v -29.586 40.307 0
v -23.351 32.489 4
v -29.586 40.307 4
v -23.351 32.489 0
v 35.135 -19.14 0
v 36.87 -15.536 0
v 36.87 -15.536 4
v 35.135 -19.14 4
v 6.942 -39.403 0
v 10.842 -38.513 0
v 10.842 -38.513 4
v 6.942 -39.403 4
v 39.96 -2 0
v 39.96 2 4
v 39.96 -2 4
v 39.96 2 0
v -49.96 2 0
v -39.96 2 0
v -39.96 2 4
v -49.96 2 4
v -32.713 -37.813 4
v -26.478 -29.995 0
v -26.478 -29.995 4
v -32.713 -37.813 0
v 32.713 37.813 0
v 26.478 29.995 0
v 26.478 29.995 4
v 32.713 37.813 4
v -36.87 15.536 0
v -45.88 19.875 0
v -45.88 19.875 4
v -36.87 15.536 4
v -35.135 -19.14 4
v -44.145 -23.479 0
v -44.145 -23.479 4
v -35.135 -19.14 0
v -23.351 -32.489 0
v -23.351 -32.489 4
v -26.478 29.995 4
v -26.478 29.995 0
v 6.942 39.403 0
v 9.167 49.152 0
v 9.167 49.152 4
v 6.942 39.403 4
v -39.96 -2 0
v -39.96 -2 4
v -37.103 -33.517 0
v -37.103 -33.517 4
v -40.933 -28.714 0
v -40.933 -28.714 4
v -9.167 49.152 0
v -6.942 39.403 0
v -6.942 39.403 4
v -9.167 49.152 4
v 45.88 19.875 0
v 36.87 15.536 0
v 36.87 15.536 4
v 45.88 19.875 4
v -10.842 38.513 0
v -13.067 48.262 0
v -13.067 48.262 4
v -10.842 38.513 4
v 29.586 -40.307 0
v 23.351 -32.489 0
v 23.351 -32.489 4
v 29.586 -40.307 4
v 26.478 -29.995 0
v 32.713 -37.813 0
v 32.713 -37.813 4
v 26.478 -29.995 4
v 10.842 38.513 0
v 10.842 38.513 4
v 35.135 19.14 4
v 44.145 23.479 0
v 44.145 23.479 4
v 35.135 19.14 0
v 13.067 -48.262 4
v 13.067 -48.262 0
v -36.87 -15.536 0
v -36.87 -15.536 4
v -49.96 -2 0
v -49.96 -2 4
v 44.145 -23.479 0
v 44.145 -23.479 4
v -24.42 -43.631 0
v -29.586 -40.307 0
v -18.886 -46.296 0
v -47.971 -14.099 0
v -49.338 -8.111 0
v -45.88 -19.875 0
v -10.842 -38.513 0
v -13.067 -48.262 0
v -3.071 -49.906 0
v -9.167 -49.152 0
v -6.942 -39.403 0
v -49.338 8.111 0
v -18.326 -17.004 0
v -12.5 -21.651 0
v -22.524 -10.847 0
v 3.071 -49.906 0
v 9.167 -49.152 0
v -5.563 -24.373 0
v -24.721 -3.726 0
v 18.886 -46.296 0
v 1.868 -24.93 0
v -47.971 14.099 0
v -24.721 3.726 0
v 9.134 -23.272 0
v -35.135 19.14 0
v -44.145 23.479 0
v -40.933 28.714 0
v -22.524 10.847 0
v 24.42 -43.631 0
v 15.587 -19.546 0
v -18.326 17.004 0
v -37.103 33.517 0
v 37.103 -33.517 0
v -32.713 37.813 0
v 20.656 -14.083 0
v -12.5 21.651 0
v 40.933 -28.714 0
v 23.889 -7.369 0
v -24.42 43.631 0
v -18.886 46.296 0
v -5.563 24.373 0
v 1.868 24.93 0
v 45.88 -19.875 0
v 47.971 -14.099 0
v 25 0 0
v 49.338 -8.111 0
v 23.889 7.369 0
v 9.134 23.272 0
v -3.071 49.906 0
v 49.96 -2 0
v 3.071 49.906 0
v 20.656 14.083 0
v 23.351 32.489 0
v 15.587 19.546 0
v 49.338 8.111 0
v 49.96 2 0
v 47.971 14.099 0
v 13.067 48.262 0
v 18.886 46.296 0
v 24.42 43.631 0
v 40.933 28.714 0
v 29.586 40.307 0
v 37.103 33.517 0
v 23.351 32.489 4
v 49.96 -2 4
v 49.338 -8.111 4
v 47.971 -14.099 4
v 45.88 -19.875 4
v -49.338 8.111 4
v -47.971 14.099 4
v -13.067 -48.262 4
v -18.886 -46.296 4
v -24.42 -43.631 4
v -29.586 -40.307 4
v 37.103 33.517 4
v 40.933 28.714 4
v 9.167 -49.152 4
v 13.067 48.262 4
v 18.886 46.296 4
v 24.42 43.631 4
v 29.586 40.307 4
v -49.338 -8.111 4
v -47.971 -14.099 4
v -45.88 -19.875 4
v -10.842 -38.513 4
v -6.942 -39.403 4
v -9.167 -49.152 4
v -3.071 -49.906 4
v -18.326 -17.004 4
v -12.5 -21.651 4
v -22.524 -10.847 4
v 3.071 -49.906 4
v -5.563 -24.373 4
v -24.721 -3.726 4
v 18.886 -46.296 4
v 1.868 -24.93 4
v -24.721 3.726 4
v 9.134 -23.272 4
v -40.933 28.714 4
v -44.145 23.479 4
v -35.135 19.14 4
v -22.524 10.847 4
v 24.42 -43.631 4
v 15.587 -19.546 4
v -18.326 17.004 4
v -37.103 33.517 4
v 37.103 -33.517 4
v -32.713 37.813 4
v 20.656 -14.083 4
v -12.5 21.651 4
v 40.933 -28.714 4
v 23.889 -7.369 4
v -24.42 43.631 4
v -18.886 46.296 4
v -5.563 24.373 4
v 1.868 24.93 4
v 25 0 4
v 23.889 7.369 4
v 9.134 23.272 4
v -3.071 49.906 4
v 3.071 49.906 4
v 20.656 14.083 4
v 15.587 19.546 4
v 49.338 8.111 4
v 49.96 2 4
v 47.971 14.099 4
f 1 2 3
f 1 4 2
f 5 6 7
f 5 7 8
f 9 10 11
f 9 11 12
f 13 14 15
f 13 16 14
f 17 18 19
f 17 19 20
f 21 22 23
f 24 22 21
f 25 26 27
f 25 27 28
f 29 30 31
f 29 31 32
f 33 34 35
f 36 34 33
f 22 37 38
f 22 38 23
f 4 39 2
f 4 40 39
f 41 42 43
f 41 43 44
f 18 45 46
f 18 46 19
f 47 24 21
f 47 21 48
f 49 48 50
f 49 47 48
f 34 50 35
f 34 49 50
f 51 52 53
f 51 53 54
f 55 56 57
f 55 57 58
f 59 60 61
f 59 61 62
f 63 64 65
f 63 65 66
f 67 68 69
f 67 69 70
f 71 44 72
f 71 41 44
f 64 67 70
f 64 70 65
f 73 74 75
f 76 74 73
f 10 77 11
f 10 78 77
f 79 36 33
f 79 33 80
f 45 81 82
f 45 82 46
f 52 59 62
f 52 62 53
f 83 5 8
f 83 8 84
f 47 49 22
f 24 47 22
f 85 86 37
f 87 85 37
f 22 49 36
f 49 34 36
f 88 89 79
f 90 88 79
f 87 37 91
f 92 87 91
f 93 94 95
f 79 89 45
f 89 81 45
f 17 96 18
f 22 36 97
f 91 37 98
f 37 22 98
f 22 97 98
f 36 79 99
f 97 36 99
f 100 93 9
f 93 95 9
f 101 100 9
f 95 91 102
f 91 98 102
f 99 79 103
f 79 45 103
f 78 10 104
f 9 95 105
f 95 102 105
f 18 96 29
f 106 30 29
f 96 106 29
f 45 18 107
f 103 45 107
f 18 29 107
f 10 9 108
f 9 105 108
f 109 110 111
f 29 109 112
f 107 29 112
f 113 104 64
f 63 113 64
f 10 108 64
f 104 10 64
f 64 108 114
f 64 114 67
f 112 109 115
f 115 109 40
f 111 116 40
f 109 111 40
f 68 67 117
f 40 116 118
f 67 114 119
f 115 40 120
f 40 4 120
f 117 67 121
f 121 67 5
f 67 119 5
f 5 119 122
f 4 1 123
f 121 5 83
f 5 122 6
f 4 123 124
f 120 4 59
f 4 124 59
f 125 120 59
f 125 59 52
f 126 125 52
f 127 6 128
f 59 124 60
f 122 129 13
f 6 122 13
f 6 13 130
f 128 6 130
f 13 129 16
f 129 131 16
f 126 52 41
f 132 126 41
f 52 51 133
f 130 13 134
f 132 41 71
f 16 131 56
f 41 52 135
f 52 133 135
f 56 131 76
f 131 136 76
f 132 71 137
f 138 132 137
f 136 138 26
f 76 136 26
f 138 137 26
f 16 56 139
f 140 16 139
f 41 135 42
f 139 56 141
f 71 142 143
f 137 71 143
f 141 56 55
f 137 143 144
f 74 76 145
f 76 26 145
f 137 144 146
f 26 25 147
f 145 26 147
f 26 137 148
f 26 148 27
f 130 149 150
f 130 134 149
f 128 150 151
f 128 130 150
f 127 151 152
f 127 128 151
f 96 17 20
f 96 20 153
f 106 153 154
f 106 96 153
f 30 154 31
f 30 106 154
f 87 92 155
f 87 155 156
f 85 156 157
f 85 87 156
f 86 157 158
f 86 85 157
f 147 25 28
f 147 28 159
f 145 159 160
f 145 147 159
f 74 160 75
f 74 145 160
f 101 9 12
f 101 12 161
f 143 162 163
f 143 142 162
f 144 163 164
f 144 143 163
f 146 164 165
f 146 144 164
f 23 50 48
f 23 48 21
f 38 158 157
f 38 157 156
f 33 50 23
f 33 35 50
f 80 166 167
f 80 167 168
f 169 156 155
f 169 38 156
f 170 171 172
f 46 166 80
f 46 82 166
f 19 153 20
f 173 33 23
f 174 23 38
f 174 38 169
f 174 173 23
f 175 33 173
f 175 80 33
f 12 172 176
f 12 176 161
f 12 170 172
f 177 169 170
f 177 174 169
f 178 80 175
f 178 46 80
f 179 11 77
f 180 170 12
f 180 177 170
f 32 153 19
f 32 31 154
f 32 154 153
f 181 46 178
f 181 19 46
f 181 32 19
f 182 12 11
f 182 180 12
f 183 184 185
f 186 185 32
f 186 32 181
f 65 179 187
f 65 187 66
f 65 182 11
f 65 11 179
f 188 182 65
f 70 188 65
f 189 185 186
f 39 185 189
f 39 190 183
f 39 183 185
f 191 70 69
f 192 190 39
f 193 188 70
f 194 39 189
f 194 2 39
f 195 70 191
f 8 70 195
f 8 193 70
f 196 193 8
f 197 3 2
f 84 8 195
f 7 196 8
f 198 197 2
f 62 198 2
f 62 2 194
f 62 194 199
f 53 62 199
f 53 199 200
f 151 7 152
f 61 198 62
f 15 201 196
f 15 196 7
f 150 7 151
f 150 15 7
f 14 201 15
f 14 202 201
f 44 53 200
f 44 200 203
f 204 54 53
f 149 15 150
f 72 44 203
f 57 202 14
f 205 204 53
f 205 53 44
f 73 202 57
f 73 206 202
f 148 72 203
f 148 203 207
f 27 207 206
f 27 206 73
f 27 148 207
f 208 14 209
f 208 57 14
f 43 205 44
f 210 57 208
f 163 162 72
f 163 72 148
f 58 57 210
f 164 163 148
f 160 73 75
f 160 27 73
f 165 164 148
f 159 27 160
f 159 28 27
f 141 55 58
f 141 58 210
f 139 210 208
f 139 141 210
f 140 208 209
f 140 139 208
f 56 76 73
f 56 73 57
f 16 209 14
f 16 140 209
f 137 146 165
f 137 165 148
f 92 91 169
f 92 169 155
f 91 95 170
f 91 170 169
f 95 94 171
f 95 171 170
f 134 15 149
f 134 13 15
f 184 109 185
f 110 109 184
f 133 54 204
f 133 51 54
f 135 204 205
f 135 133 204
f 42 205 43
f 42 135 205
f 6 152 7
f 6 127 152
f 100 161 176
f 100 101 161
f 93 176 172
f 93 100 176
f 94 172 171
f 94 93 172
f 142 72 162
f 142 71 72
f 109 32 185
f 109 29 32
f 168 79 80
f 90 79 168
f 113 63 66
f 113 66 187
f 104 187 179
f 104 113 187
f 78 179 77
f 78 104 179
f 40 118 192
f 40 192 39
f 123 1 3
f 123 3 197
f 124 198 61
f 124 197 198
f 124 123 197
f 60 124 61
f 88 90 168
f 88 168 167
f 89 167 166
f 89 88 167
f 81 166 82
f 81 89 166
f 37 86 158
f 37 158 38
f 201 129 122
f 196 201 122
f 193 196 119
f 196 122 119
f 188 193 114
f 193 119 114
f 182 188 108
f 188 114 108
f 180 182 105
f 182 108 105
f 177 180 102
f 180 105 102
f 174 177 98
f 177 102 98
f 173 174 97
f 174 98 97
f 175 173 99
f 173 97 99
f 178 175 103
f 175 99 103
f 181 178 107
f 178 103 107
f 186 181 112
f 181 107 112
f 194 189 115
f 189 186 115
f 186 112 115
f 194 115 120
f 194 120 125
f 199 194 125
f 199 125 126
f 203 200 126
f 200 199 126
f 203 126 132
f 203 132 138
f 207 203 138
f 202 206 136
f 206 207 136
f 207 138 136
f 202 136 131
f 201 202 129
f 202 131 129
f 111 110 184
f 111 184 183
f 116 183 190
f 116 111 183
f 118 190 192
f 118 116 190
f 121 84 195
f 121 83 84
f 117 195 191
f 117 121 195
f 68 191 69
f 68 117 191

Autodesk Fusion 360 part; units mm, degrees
sketch "Sketch1" plane through (0, 0, 0) normal (0, 0, 1) x (1, 0, 0)
  line L0 (0, 0) -> (20, 0)
  line L1 (20, 0) -> (120, -250)
  line L2 (120, -250) -> (70, -400)
  line L3 (70, -400) -> (50, -400)
  line L4 (4, -10) -> (14, -10)
  line L5 (53.3333, -390) -> (63.3333, -390)
  line L6 (63.3333, -386) -> (54.6667, -386)
  line L7 (100, -250) -> (54.6667, -386)
  line L8 (53.3333, -390) -> (50, -400)
  line L9 (0, 0) -> (4, -10)
  line L10 (5.6, -14) -> (100, -250)
  line L11 (14, -10) -> (14, -14)
  line L12 (5.6, -14) -> (14, -14)
  line L13 (63.3333, -390) -> (63.3333, -386)
  dimension "d4" = 400
  dimension "d5" = 50
  dimension "d6" = 50
  dimension "d7" = 250
  dimension "d9" = 20
  dimension "d10" = 20
  dimension "d11" = 20
  dimension "d12" = 10
  dimension "d13" = 4
  dimension "d14" = 10
  dimension "d15" = 10
  dimension "d16" = 4
  dimension "d17" = 10
  dimension "d27" = 4
extrude "Extrude1" add sketch "Sketch1" along normal blind 4
sketch "Sketch1 (2)" plane through (0, 0, 0) normal (0, 0, 1) x (1, 0, 0) in component "Lampi1"
component "Lampi1" placed x (1, 0, 0) y (0, 1, 0) z (0, 0, 1) at (0, 0, 0)
equation "d4 = haed_skerms"
equation "d5 = umfram_radius"
equation "d6 = umfram_radius"
equation "d7 = haed_u"
equation "d9 = Linear Dimension-6"
equation "d10 = Linear Dimension-7"
equation "d11 = Linear Dimension-8"
equation "d12 = dypt_pressfit"
equation "d13 = Linear Dimension-10"
equation "d14 = dypt_pressfit"
equation "d15 = dypt_pressfit"
equation "d16 = Linear Dimension-13"
equation "d17 = dypt_pressfit"
equation "haed_skerms = 400 mm"
equation "haed_u = 250 mm"
equation "head_l = 150 mm"
equation "dypt_pressfit = 10 mm"
equation "umfram_radius = 50 mm"

Autodesk Fusion 360 part; units mm, degrees
sketch "Sketch1" plane through (0, 0, 0) normal (0, 0, 1) x (1, 0, 0)
  circle A0 centre (0, 0) radius 25
  line L0 (49.96, 2) -> (39.96, 2)
  line L1 (39.96, 2) -> (39.96, -2)
  line L2 (39.96, -2) -> (49.96, -2)
  line L3 (44.1446, 23.4788) -> (35.1349, 19.1399)
  line L4 (36.8705, 15.536) -> (45.8802, 19.8749)
  line L5 (35.1349, 19.1399) -> (36.8705, 15.536)
  line L6 (29.5859, 40.3073) -> (23.351, 32.489)
  line L7 (26.4783, 29.995) -> (32.7132, 37.8133)
  line L8 (23.351, 32.489) -> (26.4783, 29.995)
  line L9 (9.1673, 49.1524) -> (6.9421, 39.4031)
  line L10 (10.8418, 38.5131) -> (13.067, 48.2623)
  line L11 (6.9421, 39.4031) -> (10.8418, 38.5131)
  line L12 (-13.067, 48.2623) -> (-10.8418, 38.5131)
  line L13 (-6.9421, 39.4031) -> (-9.1673, 49.1524)
  line L14 (-10.8418, 38.5131) -> (-6.9421, 39.4031)
  line L15 (-32.7132, 37.8133) -> (-26.4783, 29.995)
  line L16 (-23.351, 32.489) -> (-29.5859, 40.3073)
  line L17 (-26.4783, 29.995) -> (-23.351, 32.489)
  line L18 (-45.8802, 19.8749) -> (-36.8705, 15.536)
  line L19 (-35.1349, 19.1399) -> (-44.1446, 23.4788)
  line L20 (-36.8705, 15.536) -> (-35.1349, 19.1399)
  line L21 (-49.96, -2) -> (-39.96, -2)
  line L22 (-39.96, 2) -> (-49.96, 2)
  line L23 (-39.96, -2) -> (-39.96, 2)
  line L24 (-44.1446, -23.4788) -> (-35.1349, -19.1399)
  line L25 (-36.8705, -15.536) -> (-45.8802, -19.8749)
  line L26 (-35.1349, -19.1399) -> (-36.8705, -15.536)
  line L27 (-29.5859, -40.3073) -> (-23.351, -32.489)
  line L28 (-26.4783, -29.995) -> (-32.7132, -37.8133)
  line L29 (-23.351, -32.489) -> (-26.4783, -29.995)
  line L30 (-9.1673, -49.1524) -> (-6.9421, -39.4031)
  line L31 (-10.8418, -38.5131) -> (-13.067, -48.2623)
  line L32 (-6.9421, -39.4031) -> (-10.8418, -38.5131)
  line L33 (13.067, -48.2623) -> (10.8418, -38.5131)
  line L34 (6.9421, -39.4031) -> (9.1673, -49.1524)
  line L35 (10.8418, -38.5131) -> (6.9421, -39.4031)
  line L36 (32.7132, -37.8133) -> (26.4783, -29.995)
  line L37 (23.351, -32.489) -> (29.5859, -40.3073)
  line L38 (26.4783, -29.995) -> (23.351, -32.489)
  line L39 (45.8802, -19.8749) -> (36.8705, -15.536)
  line L40 (35.1349, -19.1399) -> (44.1446, -23.4788)
  line L41 (36.8705, -15.536) -> (35.1349, -19.1399)
  arc A1 (49.96, 2) -> (45.8802, 19.8749) centre (0, 0) ccw
  arc A2 (44.1446, 23.4788) -> (32.7132, 37.8133) centre (0, 0) ccw
  arc A3 (29.5859, 40.3073) -> (13.067, 48.2623) centre (0, 0) ccw
  arc A4 (9.1673, 49.1524) -> (-9.1673, 49.1524) centre (0, 0) ccw
  arc A5 (-13.067, 48.2623) -> (-29.5859, 40.3073) centre (0, 0) ccw
  arc A6 (-32.7132, 37.8133) -> (-44.1446, 23.4788) centre (0, 0) ccw
  arc A7 (-45.8802, 19.8749) -> (-49.96, 2) centre (0, 0) ccw
  arc A8 (-49.96, -2) -> (-45.8802, -19.8749) centre (0, 0) ccw
  arc A9 (-44.1446, -23.4788) -> (-32.7132, -37.8133) centre (0, 0) ccw
  arc A10 (-29.5859, -40.3073) -> (-13.067, -48.2623) centre (0, 0) ccw
  arc A11 (-9.1673, -49.1524) -> (9.1673, -49.1524) centre (0, 0) ccw
  arc A12 (13.067, -48.2623) -> (29.5859, -40.3073) centre (0, 0) ccw
  arc A13 (32.7132, -37.8133) -> (44.1446, -23.4788) centre (0, 0) ccw
  arc A14 (45.8802, -19.8749) -> (49.96, -2) centre (0, 0) ccw
  dimension "d1" = 100
  dimension "d6" = 50
  dimension "d7" = 10
  dimension "d8" = 10
  dimension "d9" = 4
  dimension "d11" = 360
extrude "Extrude1" add sketch "Sketch1" along normal blind 4
equation "d1 = D_o"
equation "D_o = 100 mm"
equation "D_i = 50 mm"
equation "offset = 10 mm"
equation "d6 = D_i"
equation "d7 = offset"
equation "d8 = offset"
equation "d9 = Linear Dimension-4"
